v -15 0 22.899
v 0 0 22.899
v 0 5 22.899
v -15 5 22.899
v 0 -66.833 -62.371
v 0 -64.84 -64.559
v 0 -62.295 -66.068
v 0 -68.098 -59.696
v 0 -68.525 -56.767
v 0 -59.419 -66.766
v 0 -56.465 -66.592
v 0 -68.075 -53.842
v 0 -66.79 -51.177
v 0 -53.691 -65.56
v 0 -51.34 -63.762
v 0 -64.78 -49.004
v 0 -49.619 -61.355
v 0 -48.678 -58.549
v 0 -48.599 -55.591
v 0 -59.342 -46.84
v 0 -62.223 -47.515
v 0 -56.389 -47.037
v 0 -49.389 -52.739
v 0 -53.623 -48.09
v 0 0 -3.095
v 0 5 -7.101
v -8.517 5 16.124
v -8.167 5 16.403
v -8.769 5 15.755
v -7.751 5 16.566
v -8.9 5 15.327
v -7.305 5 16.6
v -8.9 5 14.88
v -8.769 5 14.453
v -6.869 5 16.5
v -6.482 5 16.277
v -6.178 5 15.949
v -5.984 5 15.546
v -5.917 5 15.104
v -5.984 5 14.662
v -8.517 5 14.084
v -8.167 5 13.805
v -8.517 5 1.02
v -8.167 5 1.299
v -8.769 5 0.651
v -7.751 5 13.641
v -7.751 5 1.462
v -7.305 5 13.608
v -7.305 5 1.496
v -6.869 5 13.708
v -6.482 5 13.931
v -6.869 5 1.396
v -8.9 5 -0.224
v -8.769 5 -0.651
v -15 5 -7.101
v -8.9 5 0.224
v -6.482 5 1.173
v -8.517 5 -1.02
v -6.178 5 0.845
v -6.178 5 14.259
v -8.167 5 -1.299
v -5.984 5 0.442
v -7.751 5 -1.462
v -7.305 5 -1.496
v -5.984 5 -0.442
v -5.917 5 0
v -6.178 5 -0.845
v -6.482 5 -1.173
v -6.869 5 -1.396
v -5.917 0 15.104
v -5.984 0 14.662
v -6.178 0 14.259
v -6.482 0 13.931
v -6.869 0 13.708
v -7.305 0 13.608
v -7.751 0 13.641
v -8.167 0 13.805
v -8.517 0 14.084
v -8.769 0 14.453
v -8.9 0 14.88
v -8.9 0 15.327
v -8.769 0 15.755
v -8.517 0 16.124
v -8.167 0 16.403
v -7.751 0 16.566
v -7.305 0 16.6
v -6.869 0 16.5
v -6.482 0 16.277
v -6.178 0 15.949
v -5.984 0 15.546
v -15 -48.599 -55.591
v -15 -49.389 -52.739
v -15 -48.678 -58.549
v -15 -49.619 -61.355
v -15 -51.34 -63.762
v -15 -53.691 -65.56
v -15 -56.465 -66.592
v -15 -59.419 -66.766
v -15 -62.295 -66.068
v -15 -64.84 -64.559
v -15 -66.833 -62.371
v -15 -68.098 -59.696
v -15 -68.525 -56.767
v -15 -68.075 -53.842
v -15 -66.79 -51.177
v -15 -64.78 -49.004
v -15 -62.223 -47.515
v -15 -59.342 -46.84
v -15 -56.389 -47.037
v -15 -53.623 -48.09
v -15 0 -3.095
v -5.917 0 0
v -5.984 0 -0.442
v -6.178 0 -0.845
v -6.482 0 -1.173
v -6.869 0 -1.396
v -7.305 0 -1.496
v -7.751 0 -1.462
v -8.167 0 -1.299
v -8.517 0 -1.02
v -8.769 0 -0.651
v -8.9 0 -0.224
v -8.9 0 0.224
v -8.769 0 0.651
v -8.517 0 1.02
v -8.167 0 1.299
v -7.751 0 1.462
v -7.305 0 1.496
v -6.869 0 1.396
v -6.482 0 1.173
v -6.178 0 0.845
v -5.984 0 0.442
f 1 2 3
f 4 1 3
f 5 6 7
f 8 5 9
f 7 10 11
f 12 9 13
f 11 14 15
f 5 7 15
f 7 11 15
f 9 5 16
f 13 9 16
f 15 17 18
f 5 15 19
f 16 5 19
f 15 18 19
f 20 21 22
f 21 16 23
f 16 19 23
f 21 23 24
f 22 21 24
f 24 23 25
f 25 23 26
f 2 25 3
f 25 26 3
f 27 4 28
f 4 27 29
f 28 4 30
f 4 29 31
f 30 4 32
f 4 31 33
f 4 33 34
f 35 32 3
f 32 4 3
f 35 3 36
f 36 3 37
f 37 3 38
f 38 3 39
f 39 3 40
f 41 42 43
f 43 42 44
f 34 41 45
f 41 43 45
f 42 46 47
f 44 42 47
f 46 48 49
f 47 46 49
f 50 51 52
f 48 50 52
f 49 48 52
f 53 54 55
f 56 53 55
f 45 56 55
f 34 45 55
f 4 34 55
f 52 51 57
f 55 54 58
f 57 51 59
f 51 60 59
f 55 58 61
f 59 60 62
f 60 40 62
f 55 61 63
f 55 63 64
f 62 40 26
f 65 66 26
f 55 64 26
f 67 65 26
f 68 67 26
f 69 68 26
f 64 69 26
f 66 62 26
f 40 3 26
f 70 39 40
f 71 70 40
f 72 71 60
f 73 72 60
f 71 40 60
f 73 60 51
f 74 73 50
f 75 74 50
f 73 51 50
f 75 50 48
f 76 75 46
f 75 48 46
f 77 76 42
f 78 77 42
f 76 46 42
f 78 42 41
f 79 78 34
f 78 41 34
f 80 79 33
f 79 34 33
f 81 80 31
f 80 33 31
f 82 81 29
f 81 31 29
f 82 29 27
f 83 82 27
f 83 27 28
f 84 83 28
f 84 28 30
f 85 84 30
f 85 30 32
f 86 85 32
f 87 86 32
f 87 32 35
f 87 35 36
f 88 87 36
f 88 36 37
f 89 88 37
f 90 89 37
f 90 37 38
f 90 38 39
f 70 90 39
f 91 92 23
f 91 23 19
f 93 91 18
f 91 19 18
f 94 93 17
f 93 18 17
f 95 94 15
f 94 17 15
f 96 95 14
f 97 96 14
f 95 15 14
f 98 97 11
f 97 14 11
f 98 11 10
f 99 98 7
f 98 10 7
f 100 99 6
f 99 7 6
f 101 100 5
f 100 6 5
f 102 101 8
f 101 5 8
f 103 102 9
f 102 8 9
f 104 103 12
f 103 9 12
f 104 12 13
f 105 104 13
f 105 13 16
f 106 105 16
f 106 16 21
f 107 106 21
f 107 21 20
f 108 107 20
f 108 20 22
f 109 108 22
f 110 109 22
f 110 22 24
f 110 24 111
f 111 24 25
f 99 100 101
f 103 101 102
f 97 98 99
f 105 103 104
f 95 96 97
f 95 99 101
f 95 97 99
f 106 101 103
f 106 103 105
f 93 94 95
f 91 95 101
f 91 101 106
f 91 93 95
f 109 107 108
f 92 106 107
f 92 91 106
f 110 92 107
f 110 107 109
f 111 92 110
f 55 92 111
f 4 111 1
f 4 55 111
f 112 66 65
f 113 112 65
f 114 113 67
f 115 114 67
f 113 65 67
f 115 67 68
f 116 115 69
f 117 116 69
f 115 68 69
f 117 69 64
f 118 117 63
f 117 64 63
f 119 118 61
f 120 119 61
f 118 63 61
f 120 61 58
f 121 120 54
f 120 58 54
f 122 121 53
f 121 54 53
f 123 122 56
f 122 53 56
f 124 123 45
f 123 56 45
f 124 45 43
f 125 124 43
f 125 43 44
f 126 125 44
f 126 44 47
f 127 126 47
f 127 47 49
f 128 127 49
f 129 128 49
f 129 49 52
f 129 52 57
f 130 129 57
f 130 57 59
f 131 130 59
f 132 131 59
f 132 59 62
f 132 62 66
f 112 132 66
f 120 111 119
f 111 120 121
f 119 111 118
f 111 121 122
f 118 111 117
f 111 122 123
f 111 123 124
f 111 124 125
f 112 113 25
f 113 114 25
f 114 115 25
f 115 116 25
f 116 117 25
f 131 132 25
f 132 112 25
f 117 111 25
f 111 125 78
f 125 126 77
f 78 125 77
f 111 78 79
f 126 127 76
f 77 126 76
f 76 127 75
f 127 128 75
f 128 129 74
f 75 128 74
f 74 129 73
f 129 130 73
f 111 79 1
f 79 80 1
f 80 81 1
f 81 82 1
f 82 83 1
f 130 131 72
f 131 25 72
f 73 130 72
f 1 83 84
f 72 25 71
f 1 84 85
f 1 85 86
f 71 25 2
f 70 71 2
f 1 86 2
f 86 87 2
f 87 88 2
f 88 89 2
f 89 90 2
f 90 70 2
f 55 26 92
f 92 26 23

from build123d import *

# Parameters (mm, degrees)
BOSS_EXTRUDE1_DEPTH = 15
SKETCH3_R           = 1.5
CUT_EXTRUDE1_DEPTH  = 15


with BuildPart() as part:
    # Sketch2 → Boss-Extrude1 (new body)
    with BuildSketch(Plane(origin=(0, 0, 0), x_dir=(0, 0, -1), z_dir=(1, 0, 0))):
        with BuildLine():
            Line((-22.89893617, 5), (7.10106383, 5))
            Line((7.10106383, 5), (52.738984118, -49.389155461))
            ThreePointArc((52.738984118, -49.389155461), (63.539400353, -65.918178681), (48.089840145, -53.623111018))
            Line((48.089840145, -53.623111018), (3.094707467, 0))
            Line((3.094707467, 0), (-22.89893617, 0))
            Line((-22.89893617, 0), (-22.89893617, 5))
        make_face()
    extrude(amount=-BOSS_EXTRUDE1_DEPTH)

    # Sketch3 → Cut-Extrude1 (cut)
    with BuildSketch(Plane(origin=(0, 5, 0), x_dir=(1, 0, 0), z_dir=(0, 1, 0))):
        with Locations((-7.417246122, 0)):
            Circle(SKETCH3_R)
        with Locations((-7.417246122, -15.103846838)):
            Circle(SKETCH3_R)
    extrude(amount=-CUT_EXTRUDE1_DEPTH, mode=Mode.SUBTRACT)


solid = part.part
